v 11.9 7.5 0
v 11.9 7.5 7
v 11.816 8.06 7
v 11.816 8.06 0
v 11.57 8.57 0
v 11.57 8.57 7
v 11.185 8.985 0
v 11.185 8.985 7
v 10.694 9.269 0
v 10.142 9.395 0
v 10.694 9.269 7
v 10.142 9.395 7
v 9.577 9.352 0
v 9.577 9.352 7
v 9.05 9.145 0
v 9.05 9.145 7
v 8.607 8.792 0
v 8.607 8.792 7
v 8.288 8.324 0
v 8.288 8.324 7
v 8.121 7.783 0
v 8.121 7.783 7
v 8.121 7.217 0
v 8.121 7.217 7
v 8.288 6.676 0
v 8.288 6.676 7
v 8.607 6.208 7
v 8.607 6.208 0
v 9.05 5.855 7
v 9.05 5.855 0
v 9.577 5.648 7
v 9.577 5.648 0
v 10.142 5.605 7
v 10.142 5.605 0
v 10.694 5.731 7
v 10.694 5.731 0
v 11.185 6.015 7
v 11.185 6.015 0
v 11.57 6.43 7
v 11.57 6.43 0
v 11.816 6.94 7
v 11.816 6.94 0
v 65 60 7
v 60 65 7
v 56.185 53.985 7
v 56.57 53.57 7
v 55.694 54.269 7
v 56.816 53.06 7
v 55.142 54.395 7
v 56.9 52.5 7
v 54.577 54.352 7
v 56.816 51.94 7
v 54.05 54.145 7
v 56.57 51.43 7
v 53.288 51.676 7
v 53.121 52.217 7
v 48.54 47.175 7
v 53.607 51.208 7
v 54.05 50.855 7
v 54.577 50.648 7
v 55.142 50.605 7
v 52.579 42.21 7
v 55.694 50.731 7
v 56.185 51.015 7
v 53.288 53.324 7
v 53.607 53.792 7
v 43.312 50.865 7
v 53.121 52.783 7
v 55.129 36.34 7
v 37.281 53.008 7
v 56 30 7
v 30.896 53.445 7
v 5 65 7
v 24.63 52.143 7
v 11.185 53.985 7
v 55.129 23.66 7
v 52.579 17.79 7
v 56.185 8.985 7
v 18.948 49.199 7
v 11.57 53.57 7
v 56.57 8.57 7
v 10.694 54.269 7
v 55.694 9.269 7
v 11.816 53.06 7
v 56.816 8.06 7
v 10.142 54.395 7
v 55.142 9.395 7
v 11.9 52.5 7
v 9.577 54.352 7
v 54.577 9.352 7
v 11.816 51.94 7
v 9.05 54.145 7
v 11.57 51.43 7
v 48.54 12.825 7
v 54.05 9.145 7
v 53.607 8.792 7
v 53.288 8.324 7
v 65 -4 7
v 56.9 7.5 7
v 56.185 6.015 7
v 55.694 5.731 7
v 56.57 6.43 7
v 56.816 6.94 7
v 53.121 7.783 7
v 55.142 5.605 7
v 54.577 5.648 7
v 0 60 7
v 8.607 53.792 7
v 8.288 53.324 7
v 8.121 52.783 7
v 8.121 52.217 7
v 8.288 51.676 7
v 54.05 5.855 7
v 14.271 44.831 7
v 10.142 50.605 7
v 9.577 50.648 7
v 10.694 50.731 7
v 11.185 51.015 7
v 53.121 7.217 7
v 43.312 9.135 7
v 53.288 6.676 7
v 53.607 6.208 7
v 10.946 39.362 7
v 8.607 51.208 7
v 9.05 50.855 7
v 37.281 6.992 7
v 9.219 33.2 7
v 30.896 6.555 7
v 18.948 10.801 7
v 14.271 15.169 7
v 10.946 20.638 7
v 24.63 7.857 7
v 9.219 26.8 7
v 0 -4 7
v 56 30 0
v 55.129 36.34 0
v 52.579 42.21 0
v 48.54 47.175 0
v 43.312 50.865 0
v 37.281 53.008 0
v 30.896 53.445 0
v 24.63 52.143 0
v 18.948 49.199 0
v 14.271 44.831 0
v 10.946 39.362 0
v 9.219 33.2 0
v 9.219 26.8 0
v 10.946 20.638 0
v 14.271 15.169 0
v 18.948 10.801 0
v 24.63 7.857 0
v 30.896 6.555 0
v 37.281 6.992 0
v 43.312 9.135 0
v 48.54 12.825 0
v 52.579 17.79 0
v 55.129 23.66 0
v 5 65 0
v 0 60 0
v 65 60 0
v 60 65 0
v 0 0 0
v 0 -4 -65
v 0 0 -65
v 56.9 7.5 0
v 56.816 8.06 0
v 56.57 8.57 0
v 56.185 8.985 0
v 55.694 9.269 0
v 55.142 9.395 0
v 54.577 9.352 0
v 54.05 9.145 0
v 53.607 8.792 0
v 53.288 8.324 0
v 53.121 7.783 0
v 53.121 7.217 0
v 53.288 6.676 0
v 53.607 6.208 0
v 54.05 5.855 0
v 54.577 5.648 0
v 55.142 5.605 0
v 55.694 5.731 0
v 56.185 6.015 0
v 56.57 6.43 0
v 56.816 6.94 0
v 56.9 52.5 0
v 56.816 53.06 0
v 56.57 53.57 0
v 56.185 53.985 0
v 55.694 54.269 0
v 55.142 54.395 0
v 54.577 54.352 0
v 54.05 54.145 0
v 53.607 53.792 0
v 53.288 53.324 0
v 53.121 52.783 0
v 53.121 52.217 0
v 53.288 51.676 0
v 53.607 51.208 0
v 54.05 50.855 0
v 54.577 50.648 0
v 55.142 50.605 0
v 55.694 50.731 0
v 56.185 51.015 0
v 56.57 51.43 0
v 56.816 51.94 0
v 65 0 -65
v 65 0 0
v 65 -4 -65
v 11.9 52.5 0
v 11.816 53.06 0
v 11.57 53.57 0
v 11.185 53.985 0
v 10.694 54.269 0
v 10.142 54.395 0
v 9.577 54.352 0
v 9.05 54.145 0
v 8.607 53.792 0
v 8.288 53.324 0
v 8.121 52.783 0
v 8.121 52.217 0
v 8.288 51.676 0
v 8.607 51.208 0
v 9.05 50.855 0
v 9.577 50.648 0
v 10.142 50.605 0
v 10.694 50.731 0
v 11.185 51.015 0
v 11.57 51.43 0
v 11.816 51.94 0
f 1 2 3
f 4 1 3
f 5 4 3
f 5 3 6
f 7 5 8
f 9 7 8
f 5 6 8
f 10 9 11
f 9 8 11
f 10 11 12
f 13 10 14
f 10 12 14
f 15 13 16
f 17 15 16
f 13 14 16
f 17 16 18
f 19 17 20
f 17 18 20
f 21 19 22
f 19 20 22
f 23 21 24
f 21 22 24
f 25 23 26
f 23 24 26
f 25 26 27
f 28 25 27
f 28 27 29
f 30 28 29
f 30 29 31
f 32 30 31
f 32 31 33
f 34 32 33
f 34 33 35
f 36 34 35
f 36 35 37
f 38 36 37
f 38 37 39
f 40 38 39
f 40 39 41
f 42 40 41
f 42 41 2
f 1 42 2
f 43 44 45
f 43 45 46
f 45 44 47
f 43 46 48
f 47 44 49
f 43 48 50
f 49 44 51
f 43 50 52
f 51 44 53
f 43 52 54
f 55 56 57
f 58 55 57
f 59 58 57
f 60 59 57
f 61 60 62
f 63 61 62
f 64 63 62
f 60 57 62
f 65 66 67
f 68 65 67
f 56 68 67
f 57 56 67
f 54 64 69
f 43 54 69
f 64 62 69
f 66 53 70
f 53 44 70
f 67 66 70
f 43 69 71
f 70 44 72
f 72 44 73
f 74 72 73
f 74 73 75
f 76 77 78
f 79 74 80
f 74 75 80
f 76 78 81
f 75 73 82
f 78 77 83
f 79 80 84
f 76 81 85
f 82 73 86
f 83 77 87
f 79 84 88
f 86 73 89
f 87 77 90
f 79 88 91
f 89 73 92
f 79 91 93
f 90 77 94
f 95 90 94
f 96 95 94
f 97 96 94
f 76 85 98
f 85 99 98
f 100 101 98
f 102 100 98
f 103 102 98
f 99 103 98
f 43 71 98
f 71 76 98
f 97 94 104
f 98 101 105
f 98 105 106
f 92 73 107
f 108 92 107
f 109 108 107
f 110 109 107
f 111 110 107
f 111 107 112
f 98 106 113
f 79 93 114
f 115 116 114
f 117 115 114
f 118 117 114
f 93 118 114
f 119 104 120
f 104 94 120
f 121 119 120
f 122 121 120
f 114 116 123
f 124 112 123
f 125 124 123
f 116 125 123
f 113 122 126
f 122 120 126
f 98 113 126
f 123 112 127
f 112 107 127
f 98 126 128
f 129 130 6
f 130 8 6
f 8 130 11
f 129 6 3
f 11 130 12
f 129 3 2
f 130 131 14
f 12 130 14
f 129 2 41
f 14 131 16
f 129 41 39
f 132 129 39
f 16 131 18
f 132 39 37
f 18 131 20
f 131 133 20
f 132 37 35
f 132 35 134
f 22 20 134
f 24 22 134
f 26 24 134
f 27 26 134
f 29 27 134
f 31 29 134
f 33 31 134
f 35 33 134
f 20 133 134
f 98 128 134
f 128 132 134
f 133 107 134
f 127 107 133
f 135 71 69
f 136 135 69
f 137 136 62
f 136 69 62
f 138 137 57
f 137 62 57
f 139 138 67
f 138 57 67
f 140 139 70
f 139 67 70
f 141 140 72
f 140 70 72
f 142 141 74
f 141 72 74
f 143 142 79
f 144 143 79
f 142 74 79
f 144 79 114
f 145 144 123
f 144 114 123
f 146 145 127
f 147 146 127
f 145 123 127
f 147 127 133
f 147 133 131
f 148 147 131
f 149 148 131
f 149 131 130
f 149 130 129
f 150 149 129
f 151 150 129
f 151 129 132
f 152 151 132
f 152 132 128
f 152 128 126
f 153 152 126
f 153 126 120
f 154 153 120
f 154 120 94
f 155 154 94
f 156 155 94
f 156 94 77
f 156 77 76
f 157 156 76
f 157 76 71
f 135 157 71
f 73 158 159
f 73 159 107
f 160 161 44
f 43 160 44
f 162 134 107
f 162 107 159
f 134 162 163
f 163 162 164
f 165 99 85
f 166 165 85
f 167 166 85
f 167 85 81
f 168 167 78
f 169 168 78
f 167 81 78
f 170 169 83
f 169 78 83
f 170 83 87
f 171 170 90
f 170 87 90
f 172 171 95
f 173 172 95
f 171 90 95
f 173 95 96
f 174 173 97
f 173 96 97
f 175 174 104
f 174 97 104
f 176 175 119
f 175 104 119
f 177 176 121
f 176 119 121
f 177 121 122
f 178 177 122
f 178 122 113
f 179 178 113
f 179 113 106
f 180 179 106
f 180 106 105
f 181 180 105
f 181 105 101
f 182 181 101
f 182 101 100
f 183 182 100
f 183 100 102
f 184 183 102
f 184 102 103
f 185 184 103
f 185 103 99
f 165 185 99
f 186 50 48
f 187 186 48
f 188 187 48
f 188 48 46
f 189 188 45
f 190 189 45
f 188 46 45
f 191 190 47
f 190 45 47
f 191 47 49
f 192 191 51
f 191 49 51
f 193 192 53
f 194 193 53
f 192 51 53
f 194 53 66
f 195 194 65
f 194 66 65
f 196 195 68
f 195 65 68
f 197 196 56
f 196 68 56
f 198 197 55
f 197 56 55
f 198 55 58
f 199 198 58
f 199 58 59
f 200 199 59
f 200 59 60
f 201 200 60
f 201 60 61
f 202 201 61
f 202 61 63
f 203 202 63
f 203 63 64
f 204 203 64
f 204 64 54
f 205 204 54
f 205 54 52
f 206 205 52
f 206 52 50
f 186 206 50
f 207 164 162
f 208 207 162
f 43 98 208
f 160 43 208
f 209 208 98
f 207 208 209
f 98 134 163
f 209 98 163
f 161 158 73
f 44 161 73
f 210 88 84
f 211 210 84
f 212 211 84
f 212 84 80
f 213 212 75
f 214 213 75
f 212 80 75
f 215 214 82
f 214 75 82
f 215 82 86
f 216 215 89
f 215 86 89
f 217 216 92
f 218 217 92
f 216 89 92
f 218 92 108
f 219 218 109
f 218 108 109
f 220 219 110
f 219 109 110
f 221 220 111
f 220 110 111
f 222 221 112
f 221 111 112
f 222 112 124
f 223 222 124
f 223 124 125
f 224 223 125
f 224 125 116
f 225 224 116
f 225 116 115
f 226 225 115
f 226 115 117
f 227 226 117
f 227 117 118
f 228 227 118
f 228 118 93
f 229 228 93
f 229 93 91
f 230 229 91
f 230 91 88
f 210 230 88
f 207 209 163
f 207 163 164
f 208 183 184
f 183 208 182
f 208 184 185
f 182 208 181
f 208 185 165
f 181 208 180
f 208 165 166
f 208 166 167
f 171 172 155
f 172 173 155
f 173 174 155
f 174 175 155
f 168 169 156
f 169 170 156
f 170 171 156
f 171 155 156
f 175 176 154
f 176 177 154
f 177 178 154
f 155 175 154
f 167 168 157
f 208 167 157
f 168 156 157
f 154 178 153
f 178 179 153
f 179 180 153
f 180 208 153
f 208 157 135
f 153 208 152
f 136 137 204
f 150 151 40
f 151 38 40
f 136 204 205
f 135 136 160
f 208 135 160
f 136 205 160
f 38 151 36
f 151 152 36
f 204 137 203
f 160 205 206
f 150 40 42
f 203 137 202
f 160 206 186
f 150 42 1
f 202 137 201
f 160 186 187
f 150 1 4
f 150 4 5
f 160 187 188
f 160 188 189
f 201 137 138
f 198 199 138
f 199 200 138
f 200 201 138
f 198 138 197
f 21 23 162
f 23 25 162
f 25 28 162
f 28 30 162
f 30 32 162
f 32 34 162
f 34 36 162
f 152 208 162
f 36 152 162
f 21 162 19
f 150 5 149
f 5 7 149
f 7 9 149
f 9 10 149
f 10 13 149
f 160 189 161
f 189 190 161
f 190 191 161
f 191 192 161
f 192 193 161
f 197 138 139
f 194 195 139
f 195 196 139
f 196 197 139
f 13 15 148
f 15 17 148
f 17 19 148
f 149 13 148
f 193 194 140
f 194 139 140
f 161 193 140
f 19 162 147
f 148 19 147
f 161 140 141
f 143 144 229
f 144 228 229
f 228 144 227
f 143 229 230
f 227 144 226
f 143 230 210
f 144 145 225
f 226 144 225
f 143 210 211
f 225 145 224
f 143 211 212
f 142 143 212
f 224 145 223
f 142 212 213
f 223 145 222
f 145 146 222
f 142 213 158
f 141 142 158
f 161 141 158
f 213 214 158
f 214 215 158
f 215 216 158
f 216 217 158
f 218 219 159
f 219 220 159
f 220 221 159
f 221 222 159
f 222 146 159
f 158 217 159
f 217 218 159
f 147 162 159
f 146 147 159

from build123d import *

# Parameters (mm, degrees)
BOSS_EXTRUDE1_DEPTH = 65
CHAMFER1_SIZE       = 5
SKETCH4_R           = 23.5
SKETCH4_R_2         = 1.9
CUT_EXTRUDE1_DEPTH  = 65


with BuildPart() as part:
    # Sketch2 → Boss-Extrude1 (new body)
    with BuildSketch(Plane(origin=(0, 0, 0), x_dir=(0, 0, -1), z_dir=(1, 0, 0))):
        Polygon((0, 0), (0, 65), (-7, 65), (-7, -4), (65, -4), (65, 0), align=None)
    extrude(amount=BOSS_EXTRUDE1_DEPTH)

    # Chamfer1
    chamfer1_edges = [part.edges().sort_by_distance(p)[0] for p in [
        (65, 65, 3.5),
        (0, 65, 3.5),
    ]]
    chamfer(chamfer1_edges, length=CHAMFER1_SIZE)

    # Sketch4 → Cut-Extrude1 (cut)
    with BuildSketch(Plane.XY.offset(7)):
        with Locations((32.5, 30)):
            Circle(SKETCH4_R)
        with Locations((10, 52.5)):
            Circle(SKETCH4_R_2)
        with Locations((55, 52.5)):
            Circle(SKETCH4_R_2)
        with Locations((55, 7.5)):
            Circle(SKETCH4_R_2)
        with Locations((10, 7.5)):
            Circle(SKETCH4_R_2)
    extrude(amount=-CUT_EXTRUDE1_DEPTH, mode=Mode.SUBTRACT)


solid = part.part
